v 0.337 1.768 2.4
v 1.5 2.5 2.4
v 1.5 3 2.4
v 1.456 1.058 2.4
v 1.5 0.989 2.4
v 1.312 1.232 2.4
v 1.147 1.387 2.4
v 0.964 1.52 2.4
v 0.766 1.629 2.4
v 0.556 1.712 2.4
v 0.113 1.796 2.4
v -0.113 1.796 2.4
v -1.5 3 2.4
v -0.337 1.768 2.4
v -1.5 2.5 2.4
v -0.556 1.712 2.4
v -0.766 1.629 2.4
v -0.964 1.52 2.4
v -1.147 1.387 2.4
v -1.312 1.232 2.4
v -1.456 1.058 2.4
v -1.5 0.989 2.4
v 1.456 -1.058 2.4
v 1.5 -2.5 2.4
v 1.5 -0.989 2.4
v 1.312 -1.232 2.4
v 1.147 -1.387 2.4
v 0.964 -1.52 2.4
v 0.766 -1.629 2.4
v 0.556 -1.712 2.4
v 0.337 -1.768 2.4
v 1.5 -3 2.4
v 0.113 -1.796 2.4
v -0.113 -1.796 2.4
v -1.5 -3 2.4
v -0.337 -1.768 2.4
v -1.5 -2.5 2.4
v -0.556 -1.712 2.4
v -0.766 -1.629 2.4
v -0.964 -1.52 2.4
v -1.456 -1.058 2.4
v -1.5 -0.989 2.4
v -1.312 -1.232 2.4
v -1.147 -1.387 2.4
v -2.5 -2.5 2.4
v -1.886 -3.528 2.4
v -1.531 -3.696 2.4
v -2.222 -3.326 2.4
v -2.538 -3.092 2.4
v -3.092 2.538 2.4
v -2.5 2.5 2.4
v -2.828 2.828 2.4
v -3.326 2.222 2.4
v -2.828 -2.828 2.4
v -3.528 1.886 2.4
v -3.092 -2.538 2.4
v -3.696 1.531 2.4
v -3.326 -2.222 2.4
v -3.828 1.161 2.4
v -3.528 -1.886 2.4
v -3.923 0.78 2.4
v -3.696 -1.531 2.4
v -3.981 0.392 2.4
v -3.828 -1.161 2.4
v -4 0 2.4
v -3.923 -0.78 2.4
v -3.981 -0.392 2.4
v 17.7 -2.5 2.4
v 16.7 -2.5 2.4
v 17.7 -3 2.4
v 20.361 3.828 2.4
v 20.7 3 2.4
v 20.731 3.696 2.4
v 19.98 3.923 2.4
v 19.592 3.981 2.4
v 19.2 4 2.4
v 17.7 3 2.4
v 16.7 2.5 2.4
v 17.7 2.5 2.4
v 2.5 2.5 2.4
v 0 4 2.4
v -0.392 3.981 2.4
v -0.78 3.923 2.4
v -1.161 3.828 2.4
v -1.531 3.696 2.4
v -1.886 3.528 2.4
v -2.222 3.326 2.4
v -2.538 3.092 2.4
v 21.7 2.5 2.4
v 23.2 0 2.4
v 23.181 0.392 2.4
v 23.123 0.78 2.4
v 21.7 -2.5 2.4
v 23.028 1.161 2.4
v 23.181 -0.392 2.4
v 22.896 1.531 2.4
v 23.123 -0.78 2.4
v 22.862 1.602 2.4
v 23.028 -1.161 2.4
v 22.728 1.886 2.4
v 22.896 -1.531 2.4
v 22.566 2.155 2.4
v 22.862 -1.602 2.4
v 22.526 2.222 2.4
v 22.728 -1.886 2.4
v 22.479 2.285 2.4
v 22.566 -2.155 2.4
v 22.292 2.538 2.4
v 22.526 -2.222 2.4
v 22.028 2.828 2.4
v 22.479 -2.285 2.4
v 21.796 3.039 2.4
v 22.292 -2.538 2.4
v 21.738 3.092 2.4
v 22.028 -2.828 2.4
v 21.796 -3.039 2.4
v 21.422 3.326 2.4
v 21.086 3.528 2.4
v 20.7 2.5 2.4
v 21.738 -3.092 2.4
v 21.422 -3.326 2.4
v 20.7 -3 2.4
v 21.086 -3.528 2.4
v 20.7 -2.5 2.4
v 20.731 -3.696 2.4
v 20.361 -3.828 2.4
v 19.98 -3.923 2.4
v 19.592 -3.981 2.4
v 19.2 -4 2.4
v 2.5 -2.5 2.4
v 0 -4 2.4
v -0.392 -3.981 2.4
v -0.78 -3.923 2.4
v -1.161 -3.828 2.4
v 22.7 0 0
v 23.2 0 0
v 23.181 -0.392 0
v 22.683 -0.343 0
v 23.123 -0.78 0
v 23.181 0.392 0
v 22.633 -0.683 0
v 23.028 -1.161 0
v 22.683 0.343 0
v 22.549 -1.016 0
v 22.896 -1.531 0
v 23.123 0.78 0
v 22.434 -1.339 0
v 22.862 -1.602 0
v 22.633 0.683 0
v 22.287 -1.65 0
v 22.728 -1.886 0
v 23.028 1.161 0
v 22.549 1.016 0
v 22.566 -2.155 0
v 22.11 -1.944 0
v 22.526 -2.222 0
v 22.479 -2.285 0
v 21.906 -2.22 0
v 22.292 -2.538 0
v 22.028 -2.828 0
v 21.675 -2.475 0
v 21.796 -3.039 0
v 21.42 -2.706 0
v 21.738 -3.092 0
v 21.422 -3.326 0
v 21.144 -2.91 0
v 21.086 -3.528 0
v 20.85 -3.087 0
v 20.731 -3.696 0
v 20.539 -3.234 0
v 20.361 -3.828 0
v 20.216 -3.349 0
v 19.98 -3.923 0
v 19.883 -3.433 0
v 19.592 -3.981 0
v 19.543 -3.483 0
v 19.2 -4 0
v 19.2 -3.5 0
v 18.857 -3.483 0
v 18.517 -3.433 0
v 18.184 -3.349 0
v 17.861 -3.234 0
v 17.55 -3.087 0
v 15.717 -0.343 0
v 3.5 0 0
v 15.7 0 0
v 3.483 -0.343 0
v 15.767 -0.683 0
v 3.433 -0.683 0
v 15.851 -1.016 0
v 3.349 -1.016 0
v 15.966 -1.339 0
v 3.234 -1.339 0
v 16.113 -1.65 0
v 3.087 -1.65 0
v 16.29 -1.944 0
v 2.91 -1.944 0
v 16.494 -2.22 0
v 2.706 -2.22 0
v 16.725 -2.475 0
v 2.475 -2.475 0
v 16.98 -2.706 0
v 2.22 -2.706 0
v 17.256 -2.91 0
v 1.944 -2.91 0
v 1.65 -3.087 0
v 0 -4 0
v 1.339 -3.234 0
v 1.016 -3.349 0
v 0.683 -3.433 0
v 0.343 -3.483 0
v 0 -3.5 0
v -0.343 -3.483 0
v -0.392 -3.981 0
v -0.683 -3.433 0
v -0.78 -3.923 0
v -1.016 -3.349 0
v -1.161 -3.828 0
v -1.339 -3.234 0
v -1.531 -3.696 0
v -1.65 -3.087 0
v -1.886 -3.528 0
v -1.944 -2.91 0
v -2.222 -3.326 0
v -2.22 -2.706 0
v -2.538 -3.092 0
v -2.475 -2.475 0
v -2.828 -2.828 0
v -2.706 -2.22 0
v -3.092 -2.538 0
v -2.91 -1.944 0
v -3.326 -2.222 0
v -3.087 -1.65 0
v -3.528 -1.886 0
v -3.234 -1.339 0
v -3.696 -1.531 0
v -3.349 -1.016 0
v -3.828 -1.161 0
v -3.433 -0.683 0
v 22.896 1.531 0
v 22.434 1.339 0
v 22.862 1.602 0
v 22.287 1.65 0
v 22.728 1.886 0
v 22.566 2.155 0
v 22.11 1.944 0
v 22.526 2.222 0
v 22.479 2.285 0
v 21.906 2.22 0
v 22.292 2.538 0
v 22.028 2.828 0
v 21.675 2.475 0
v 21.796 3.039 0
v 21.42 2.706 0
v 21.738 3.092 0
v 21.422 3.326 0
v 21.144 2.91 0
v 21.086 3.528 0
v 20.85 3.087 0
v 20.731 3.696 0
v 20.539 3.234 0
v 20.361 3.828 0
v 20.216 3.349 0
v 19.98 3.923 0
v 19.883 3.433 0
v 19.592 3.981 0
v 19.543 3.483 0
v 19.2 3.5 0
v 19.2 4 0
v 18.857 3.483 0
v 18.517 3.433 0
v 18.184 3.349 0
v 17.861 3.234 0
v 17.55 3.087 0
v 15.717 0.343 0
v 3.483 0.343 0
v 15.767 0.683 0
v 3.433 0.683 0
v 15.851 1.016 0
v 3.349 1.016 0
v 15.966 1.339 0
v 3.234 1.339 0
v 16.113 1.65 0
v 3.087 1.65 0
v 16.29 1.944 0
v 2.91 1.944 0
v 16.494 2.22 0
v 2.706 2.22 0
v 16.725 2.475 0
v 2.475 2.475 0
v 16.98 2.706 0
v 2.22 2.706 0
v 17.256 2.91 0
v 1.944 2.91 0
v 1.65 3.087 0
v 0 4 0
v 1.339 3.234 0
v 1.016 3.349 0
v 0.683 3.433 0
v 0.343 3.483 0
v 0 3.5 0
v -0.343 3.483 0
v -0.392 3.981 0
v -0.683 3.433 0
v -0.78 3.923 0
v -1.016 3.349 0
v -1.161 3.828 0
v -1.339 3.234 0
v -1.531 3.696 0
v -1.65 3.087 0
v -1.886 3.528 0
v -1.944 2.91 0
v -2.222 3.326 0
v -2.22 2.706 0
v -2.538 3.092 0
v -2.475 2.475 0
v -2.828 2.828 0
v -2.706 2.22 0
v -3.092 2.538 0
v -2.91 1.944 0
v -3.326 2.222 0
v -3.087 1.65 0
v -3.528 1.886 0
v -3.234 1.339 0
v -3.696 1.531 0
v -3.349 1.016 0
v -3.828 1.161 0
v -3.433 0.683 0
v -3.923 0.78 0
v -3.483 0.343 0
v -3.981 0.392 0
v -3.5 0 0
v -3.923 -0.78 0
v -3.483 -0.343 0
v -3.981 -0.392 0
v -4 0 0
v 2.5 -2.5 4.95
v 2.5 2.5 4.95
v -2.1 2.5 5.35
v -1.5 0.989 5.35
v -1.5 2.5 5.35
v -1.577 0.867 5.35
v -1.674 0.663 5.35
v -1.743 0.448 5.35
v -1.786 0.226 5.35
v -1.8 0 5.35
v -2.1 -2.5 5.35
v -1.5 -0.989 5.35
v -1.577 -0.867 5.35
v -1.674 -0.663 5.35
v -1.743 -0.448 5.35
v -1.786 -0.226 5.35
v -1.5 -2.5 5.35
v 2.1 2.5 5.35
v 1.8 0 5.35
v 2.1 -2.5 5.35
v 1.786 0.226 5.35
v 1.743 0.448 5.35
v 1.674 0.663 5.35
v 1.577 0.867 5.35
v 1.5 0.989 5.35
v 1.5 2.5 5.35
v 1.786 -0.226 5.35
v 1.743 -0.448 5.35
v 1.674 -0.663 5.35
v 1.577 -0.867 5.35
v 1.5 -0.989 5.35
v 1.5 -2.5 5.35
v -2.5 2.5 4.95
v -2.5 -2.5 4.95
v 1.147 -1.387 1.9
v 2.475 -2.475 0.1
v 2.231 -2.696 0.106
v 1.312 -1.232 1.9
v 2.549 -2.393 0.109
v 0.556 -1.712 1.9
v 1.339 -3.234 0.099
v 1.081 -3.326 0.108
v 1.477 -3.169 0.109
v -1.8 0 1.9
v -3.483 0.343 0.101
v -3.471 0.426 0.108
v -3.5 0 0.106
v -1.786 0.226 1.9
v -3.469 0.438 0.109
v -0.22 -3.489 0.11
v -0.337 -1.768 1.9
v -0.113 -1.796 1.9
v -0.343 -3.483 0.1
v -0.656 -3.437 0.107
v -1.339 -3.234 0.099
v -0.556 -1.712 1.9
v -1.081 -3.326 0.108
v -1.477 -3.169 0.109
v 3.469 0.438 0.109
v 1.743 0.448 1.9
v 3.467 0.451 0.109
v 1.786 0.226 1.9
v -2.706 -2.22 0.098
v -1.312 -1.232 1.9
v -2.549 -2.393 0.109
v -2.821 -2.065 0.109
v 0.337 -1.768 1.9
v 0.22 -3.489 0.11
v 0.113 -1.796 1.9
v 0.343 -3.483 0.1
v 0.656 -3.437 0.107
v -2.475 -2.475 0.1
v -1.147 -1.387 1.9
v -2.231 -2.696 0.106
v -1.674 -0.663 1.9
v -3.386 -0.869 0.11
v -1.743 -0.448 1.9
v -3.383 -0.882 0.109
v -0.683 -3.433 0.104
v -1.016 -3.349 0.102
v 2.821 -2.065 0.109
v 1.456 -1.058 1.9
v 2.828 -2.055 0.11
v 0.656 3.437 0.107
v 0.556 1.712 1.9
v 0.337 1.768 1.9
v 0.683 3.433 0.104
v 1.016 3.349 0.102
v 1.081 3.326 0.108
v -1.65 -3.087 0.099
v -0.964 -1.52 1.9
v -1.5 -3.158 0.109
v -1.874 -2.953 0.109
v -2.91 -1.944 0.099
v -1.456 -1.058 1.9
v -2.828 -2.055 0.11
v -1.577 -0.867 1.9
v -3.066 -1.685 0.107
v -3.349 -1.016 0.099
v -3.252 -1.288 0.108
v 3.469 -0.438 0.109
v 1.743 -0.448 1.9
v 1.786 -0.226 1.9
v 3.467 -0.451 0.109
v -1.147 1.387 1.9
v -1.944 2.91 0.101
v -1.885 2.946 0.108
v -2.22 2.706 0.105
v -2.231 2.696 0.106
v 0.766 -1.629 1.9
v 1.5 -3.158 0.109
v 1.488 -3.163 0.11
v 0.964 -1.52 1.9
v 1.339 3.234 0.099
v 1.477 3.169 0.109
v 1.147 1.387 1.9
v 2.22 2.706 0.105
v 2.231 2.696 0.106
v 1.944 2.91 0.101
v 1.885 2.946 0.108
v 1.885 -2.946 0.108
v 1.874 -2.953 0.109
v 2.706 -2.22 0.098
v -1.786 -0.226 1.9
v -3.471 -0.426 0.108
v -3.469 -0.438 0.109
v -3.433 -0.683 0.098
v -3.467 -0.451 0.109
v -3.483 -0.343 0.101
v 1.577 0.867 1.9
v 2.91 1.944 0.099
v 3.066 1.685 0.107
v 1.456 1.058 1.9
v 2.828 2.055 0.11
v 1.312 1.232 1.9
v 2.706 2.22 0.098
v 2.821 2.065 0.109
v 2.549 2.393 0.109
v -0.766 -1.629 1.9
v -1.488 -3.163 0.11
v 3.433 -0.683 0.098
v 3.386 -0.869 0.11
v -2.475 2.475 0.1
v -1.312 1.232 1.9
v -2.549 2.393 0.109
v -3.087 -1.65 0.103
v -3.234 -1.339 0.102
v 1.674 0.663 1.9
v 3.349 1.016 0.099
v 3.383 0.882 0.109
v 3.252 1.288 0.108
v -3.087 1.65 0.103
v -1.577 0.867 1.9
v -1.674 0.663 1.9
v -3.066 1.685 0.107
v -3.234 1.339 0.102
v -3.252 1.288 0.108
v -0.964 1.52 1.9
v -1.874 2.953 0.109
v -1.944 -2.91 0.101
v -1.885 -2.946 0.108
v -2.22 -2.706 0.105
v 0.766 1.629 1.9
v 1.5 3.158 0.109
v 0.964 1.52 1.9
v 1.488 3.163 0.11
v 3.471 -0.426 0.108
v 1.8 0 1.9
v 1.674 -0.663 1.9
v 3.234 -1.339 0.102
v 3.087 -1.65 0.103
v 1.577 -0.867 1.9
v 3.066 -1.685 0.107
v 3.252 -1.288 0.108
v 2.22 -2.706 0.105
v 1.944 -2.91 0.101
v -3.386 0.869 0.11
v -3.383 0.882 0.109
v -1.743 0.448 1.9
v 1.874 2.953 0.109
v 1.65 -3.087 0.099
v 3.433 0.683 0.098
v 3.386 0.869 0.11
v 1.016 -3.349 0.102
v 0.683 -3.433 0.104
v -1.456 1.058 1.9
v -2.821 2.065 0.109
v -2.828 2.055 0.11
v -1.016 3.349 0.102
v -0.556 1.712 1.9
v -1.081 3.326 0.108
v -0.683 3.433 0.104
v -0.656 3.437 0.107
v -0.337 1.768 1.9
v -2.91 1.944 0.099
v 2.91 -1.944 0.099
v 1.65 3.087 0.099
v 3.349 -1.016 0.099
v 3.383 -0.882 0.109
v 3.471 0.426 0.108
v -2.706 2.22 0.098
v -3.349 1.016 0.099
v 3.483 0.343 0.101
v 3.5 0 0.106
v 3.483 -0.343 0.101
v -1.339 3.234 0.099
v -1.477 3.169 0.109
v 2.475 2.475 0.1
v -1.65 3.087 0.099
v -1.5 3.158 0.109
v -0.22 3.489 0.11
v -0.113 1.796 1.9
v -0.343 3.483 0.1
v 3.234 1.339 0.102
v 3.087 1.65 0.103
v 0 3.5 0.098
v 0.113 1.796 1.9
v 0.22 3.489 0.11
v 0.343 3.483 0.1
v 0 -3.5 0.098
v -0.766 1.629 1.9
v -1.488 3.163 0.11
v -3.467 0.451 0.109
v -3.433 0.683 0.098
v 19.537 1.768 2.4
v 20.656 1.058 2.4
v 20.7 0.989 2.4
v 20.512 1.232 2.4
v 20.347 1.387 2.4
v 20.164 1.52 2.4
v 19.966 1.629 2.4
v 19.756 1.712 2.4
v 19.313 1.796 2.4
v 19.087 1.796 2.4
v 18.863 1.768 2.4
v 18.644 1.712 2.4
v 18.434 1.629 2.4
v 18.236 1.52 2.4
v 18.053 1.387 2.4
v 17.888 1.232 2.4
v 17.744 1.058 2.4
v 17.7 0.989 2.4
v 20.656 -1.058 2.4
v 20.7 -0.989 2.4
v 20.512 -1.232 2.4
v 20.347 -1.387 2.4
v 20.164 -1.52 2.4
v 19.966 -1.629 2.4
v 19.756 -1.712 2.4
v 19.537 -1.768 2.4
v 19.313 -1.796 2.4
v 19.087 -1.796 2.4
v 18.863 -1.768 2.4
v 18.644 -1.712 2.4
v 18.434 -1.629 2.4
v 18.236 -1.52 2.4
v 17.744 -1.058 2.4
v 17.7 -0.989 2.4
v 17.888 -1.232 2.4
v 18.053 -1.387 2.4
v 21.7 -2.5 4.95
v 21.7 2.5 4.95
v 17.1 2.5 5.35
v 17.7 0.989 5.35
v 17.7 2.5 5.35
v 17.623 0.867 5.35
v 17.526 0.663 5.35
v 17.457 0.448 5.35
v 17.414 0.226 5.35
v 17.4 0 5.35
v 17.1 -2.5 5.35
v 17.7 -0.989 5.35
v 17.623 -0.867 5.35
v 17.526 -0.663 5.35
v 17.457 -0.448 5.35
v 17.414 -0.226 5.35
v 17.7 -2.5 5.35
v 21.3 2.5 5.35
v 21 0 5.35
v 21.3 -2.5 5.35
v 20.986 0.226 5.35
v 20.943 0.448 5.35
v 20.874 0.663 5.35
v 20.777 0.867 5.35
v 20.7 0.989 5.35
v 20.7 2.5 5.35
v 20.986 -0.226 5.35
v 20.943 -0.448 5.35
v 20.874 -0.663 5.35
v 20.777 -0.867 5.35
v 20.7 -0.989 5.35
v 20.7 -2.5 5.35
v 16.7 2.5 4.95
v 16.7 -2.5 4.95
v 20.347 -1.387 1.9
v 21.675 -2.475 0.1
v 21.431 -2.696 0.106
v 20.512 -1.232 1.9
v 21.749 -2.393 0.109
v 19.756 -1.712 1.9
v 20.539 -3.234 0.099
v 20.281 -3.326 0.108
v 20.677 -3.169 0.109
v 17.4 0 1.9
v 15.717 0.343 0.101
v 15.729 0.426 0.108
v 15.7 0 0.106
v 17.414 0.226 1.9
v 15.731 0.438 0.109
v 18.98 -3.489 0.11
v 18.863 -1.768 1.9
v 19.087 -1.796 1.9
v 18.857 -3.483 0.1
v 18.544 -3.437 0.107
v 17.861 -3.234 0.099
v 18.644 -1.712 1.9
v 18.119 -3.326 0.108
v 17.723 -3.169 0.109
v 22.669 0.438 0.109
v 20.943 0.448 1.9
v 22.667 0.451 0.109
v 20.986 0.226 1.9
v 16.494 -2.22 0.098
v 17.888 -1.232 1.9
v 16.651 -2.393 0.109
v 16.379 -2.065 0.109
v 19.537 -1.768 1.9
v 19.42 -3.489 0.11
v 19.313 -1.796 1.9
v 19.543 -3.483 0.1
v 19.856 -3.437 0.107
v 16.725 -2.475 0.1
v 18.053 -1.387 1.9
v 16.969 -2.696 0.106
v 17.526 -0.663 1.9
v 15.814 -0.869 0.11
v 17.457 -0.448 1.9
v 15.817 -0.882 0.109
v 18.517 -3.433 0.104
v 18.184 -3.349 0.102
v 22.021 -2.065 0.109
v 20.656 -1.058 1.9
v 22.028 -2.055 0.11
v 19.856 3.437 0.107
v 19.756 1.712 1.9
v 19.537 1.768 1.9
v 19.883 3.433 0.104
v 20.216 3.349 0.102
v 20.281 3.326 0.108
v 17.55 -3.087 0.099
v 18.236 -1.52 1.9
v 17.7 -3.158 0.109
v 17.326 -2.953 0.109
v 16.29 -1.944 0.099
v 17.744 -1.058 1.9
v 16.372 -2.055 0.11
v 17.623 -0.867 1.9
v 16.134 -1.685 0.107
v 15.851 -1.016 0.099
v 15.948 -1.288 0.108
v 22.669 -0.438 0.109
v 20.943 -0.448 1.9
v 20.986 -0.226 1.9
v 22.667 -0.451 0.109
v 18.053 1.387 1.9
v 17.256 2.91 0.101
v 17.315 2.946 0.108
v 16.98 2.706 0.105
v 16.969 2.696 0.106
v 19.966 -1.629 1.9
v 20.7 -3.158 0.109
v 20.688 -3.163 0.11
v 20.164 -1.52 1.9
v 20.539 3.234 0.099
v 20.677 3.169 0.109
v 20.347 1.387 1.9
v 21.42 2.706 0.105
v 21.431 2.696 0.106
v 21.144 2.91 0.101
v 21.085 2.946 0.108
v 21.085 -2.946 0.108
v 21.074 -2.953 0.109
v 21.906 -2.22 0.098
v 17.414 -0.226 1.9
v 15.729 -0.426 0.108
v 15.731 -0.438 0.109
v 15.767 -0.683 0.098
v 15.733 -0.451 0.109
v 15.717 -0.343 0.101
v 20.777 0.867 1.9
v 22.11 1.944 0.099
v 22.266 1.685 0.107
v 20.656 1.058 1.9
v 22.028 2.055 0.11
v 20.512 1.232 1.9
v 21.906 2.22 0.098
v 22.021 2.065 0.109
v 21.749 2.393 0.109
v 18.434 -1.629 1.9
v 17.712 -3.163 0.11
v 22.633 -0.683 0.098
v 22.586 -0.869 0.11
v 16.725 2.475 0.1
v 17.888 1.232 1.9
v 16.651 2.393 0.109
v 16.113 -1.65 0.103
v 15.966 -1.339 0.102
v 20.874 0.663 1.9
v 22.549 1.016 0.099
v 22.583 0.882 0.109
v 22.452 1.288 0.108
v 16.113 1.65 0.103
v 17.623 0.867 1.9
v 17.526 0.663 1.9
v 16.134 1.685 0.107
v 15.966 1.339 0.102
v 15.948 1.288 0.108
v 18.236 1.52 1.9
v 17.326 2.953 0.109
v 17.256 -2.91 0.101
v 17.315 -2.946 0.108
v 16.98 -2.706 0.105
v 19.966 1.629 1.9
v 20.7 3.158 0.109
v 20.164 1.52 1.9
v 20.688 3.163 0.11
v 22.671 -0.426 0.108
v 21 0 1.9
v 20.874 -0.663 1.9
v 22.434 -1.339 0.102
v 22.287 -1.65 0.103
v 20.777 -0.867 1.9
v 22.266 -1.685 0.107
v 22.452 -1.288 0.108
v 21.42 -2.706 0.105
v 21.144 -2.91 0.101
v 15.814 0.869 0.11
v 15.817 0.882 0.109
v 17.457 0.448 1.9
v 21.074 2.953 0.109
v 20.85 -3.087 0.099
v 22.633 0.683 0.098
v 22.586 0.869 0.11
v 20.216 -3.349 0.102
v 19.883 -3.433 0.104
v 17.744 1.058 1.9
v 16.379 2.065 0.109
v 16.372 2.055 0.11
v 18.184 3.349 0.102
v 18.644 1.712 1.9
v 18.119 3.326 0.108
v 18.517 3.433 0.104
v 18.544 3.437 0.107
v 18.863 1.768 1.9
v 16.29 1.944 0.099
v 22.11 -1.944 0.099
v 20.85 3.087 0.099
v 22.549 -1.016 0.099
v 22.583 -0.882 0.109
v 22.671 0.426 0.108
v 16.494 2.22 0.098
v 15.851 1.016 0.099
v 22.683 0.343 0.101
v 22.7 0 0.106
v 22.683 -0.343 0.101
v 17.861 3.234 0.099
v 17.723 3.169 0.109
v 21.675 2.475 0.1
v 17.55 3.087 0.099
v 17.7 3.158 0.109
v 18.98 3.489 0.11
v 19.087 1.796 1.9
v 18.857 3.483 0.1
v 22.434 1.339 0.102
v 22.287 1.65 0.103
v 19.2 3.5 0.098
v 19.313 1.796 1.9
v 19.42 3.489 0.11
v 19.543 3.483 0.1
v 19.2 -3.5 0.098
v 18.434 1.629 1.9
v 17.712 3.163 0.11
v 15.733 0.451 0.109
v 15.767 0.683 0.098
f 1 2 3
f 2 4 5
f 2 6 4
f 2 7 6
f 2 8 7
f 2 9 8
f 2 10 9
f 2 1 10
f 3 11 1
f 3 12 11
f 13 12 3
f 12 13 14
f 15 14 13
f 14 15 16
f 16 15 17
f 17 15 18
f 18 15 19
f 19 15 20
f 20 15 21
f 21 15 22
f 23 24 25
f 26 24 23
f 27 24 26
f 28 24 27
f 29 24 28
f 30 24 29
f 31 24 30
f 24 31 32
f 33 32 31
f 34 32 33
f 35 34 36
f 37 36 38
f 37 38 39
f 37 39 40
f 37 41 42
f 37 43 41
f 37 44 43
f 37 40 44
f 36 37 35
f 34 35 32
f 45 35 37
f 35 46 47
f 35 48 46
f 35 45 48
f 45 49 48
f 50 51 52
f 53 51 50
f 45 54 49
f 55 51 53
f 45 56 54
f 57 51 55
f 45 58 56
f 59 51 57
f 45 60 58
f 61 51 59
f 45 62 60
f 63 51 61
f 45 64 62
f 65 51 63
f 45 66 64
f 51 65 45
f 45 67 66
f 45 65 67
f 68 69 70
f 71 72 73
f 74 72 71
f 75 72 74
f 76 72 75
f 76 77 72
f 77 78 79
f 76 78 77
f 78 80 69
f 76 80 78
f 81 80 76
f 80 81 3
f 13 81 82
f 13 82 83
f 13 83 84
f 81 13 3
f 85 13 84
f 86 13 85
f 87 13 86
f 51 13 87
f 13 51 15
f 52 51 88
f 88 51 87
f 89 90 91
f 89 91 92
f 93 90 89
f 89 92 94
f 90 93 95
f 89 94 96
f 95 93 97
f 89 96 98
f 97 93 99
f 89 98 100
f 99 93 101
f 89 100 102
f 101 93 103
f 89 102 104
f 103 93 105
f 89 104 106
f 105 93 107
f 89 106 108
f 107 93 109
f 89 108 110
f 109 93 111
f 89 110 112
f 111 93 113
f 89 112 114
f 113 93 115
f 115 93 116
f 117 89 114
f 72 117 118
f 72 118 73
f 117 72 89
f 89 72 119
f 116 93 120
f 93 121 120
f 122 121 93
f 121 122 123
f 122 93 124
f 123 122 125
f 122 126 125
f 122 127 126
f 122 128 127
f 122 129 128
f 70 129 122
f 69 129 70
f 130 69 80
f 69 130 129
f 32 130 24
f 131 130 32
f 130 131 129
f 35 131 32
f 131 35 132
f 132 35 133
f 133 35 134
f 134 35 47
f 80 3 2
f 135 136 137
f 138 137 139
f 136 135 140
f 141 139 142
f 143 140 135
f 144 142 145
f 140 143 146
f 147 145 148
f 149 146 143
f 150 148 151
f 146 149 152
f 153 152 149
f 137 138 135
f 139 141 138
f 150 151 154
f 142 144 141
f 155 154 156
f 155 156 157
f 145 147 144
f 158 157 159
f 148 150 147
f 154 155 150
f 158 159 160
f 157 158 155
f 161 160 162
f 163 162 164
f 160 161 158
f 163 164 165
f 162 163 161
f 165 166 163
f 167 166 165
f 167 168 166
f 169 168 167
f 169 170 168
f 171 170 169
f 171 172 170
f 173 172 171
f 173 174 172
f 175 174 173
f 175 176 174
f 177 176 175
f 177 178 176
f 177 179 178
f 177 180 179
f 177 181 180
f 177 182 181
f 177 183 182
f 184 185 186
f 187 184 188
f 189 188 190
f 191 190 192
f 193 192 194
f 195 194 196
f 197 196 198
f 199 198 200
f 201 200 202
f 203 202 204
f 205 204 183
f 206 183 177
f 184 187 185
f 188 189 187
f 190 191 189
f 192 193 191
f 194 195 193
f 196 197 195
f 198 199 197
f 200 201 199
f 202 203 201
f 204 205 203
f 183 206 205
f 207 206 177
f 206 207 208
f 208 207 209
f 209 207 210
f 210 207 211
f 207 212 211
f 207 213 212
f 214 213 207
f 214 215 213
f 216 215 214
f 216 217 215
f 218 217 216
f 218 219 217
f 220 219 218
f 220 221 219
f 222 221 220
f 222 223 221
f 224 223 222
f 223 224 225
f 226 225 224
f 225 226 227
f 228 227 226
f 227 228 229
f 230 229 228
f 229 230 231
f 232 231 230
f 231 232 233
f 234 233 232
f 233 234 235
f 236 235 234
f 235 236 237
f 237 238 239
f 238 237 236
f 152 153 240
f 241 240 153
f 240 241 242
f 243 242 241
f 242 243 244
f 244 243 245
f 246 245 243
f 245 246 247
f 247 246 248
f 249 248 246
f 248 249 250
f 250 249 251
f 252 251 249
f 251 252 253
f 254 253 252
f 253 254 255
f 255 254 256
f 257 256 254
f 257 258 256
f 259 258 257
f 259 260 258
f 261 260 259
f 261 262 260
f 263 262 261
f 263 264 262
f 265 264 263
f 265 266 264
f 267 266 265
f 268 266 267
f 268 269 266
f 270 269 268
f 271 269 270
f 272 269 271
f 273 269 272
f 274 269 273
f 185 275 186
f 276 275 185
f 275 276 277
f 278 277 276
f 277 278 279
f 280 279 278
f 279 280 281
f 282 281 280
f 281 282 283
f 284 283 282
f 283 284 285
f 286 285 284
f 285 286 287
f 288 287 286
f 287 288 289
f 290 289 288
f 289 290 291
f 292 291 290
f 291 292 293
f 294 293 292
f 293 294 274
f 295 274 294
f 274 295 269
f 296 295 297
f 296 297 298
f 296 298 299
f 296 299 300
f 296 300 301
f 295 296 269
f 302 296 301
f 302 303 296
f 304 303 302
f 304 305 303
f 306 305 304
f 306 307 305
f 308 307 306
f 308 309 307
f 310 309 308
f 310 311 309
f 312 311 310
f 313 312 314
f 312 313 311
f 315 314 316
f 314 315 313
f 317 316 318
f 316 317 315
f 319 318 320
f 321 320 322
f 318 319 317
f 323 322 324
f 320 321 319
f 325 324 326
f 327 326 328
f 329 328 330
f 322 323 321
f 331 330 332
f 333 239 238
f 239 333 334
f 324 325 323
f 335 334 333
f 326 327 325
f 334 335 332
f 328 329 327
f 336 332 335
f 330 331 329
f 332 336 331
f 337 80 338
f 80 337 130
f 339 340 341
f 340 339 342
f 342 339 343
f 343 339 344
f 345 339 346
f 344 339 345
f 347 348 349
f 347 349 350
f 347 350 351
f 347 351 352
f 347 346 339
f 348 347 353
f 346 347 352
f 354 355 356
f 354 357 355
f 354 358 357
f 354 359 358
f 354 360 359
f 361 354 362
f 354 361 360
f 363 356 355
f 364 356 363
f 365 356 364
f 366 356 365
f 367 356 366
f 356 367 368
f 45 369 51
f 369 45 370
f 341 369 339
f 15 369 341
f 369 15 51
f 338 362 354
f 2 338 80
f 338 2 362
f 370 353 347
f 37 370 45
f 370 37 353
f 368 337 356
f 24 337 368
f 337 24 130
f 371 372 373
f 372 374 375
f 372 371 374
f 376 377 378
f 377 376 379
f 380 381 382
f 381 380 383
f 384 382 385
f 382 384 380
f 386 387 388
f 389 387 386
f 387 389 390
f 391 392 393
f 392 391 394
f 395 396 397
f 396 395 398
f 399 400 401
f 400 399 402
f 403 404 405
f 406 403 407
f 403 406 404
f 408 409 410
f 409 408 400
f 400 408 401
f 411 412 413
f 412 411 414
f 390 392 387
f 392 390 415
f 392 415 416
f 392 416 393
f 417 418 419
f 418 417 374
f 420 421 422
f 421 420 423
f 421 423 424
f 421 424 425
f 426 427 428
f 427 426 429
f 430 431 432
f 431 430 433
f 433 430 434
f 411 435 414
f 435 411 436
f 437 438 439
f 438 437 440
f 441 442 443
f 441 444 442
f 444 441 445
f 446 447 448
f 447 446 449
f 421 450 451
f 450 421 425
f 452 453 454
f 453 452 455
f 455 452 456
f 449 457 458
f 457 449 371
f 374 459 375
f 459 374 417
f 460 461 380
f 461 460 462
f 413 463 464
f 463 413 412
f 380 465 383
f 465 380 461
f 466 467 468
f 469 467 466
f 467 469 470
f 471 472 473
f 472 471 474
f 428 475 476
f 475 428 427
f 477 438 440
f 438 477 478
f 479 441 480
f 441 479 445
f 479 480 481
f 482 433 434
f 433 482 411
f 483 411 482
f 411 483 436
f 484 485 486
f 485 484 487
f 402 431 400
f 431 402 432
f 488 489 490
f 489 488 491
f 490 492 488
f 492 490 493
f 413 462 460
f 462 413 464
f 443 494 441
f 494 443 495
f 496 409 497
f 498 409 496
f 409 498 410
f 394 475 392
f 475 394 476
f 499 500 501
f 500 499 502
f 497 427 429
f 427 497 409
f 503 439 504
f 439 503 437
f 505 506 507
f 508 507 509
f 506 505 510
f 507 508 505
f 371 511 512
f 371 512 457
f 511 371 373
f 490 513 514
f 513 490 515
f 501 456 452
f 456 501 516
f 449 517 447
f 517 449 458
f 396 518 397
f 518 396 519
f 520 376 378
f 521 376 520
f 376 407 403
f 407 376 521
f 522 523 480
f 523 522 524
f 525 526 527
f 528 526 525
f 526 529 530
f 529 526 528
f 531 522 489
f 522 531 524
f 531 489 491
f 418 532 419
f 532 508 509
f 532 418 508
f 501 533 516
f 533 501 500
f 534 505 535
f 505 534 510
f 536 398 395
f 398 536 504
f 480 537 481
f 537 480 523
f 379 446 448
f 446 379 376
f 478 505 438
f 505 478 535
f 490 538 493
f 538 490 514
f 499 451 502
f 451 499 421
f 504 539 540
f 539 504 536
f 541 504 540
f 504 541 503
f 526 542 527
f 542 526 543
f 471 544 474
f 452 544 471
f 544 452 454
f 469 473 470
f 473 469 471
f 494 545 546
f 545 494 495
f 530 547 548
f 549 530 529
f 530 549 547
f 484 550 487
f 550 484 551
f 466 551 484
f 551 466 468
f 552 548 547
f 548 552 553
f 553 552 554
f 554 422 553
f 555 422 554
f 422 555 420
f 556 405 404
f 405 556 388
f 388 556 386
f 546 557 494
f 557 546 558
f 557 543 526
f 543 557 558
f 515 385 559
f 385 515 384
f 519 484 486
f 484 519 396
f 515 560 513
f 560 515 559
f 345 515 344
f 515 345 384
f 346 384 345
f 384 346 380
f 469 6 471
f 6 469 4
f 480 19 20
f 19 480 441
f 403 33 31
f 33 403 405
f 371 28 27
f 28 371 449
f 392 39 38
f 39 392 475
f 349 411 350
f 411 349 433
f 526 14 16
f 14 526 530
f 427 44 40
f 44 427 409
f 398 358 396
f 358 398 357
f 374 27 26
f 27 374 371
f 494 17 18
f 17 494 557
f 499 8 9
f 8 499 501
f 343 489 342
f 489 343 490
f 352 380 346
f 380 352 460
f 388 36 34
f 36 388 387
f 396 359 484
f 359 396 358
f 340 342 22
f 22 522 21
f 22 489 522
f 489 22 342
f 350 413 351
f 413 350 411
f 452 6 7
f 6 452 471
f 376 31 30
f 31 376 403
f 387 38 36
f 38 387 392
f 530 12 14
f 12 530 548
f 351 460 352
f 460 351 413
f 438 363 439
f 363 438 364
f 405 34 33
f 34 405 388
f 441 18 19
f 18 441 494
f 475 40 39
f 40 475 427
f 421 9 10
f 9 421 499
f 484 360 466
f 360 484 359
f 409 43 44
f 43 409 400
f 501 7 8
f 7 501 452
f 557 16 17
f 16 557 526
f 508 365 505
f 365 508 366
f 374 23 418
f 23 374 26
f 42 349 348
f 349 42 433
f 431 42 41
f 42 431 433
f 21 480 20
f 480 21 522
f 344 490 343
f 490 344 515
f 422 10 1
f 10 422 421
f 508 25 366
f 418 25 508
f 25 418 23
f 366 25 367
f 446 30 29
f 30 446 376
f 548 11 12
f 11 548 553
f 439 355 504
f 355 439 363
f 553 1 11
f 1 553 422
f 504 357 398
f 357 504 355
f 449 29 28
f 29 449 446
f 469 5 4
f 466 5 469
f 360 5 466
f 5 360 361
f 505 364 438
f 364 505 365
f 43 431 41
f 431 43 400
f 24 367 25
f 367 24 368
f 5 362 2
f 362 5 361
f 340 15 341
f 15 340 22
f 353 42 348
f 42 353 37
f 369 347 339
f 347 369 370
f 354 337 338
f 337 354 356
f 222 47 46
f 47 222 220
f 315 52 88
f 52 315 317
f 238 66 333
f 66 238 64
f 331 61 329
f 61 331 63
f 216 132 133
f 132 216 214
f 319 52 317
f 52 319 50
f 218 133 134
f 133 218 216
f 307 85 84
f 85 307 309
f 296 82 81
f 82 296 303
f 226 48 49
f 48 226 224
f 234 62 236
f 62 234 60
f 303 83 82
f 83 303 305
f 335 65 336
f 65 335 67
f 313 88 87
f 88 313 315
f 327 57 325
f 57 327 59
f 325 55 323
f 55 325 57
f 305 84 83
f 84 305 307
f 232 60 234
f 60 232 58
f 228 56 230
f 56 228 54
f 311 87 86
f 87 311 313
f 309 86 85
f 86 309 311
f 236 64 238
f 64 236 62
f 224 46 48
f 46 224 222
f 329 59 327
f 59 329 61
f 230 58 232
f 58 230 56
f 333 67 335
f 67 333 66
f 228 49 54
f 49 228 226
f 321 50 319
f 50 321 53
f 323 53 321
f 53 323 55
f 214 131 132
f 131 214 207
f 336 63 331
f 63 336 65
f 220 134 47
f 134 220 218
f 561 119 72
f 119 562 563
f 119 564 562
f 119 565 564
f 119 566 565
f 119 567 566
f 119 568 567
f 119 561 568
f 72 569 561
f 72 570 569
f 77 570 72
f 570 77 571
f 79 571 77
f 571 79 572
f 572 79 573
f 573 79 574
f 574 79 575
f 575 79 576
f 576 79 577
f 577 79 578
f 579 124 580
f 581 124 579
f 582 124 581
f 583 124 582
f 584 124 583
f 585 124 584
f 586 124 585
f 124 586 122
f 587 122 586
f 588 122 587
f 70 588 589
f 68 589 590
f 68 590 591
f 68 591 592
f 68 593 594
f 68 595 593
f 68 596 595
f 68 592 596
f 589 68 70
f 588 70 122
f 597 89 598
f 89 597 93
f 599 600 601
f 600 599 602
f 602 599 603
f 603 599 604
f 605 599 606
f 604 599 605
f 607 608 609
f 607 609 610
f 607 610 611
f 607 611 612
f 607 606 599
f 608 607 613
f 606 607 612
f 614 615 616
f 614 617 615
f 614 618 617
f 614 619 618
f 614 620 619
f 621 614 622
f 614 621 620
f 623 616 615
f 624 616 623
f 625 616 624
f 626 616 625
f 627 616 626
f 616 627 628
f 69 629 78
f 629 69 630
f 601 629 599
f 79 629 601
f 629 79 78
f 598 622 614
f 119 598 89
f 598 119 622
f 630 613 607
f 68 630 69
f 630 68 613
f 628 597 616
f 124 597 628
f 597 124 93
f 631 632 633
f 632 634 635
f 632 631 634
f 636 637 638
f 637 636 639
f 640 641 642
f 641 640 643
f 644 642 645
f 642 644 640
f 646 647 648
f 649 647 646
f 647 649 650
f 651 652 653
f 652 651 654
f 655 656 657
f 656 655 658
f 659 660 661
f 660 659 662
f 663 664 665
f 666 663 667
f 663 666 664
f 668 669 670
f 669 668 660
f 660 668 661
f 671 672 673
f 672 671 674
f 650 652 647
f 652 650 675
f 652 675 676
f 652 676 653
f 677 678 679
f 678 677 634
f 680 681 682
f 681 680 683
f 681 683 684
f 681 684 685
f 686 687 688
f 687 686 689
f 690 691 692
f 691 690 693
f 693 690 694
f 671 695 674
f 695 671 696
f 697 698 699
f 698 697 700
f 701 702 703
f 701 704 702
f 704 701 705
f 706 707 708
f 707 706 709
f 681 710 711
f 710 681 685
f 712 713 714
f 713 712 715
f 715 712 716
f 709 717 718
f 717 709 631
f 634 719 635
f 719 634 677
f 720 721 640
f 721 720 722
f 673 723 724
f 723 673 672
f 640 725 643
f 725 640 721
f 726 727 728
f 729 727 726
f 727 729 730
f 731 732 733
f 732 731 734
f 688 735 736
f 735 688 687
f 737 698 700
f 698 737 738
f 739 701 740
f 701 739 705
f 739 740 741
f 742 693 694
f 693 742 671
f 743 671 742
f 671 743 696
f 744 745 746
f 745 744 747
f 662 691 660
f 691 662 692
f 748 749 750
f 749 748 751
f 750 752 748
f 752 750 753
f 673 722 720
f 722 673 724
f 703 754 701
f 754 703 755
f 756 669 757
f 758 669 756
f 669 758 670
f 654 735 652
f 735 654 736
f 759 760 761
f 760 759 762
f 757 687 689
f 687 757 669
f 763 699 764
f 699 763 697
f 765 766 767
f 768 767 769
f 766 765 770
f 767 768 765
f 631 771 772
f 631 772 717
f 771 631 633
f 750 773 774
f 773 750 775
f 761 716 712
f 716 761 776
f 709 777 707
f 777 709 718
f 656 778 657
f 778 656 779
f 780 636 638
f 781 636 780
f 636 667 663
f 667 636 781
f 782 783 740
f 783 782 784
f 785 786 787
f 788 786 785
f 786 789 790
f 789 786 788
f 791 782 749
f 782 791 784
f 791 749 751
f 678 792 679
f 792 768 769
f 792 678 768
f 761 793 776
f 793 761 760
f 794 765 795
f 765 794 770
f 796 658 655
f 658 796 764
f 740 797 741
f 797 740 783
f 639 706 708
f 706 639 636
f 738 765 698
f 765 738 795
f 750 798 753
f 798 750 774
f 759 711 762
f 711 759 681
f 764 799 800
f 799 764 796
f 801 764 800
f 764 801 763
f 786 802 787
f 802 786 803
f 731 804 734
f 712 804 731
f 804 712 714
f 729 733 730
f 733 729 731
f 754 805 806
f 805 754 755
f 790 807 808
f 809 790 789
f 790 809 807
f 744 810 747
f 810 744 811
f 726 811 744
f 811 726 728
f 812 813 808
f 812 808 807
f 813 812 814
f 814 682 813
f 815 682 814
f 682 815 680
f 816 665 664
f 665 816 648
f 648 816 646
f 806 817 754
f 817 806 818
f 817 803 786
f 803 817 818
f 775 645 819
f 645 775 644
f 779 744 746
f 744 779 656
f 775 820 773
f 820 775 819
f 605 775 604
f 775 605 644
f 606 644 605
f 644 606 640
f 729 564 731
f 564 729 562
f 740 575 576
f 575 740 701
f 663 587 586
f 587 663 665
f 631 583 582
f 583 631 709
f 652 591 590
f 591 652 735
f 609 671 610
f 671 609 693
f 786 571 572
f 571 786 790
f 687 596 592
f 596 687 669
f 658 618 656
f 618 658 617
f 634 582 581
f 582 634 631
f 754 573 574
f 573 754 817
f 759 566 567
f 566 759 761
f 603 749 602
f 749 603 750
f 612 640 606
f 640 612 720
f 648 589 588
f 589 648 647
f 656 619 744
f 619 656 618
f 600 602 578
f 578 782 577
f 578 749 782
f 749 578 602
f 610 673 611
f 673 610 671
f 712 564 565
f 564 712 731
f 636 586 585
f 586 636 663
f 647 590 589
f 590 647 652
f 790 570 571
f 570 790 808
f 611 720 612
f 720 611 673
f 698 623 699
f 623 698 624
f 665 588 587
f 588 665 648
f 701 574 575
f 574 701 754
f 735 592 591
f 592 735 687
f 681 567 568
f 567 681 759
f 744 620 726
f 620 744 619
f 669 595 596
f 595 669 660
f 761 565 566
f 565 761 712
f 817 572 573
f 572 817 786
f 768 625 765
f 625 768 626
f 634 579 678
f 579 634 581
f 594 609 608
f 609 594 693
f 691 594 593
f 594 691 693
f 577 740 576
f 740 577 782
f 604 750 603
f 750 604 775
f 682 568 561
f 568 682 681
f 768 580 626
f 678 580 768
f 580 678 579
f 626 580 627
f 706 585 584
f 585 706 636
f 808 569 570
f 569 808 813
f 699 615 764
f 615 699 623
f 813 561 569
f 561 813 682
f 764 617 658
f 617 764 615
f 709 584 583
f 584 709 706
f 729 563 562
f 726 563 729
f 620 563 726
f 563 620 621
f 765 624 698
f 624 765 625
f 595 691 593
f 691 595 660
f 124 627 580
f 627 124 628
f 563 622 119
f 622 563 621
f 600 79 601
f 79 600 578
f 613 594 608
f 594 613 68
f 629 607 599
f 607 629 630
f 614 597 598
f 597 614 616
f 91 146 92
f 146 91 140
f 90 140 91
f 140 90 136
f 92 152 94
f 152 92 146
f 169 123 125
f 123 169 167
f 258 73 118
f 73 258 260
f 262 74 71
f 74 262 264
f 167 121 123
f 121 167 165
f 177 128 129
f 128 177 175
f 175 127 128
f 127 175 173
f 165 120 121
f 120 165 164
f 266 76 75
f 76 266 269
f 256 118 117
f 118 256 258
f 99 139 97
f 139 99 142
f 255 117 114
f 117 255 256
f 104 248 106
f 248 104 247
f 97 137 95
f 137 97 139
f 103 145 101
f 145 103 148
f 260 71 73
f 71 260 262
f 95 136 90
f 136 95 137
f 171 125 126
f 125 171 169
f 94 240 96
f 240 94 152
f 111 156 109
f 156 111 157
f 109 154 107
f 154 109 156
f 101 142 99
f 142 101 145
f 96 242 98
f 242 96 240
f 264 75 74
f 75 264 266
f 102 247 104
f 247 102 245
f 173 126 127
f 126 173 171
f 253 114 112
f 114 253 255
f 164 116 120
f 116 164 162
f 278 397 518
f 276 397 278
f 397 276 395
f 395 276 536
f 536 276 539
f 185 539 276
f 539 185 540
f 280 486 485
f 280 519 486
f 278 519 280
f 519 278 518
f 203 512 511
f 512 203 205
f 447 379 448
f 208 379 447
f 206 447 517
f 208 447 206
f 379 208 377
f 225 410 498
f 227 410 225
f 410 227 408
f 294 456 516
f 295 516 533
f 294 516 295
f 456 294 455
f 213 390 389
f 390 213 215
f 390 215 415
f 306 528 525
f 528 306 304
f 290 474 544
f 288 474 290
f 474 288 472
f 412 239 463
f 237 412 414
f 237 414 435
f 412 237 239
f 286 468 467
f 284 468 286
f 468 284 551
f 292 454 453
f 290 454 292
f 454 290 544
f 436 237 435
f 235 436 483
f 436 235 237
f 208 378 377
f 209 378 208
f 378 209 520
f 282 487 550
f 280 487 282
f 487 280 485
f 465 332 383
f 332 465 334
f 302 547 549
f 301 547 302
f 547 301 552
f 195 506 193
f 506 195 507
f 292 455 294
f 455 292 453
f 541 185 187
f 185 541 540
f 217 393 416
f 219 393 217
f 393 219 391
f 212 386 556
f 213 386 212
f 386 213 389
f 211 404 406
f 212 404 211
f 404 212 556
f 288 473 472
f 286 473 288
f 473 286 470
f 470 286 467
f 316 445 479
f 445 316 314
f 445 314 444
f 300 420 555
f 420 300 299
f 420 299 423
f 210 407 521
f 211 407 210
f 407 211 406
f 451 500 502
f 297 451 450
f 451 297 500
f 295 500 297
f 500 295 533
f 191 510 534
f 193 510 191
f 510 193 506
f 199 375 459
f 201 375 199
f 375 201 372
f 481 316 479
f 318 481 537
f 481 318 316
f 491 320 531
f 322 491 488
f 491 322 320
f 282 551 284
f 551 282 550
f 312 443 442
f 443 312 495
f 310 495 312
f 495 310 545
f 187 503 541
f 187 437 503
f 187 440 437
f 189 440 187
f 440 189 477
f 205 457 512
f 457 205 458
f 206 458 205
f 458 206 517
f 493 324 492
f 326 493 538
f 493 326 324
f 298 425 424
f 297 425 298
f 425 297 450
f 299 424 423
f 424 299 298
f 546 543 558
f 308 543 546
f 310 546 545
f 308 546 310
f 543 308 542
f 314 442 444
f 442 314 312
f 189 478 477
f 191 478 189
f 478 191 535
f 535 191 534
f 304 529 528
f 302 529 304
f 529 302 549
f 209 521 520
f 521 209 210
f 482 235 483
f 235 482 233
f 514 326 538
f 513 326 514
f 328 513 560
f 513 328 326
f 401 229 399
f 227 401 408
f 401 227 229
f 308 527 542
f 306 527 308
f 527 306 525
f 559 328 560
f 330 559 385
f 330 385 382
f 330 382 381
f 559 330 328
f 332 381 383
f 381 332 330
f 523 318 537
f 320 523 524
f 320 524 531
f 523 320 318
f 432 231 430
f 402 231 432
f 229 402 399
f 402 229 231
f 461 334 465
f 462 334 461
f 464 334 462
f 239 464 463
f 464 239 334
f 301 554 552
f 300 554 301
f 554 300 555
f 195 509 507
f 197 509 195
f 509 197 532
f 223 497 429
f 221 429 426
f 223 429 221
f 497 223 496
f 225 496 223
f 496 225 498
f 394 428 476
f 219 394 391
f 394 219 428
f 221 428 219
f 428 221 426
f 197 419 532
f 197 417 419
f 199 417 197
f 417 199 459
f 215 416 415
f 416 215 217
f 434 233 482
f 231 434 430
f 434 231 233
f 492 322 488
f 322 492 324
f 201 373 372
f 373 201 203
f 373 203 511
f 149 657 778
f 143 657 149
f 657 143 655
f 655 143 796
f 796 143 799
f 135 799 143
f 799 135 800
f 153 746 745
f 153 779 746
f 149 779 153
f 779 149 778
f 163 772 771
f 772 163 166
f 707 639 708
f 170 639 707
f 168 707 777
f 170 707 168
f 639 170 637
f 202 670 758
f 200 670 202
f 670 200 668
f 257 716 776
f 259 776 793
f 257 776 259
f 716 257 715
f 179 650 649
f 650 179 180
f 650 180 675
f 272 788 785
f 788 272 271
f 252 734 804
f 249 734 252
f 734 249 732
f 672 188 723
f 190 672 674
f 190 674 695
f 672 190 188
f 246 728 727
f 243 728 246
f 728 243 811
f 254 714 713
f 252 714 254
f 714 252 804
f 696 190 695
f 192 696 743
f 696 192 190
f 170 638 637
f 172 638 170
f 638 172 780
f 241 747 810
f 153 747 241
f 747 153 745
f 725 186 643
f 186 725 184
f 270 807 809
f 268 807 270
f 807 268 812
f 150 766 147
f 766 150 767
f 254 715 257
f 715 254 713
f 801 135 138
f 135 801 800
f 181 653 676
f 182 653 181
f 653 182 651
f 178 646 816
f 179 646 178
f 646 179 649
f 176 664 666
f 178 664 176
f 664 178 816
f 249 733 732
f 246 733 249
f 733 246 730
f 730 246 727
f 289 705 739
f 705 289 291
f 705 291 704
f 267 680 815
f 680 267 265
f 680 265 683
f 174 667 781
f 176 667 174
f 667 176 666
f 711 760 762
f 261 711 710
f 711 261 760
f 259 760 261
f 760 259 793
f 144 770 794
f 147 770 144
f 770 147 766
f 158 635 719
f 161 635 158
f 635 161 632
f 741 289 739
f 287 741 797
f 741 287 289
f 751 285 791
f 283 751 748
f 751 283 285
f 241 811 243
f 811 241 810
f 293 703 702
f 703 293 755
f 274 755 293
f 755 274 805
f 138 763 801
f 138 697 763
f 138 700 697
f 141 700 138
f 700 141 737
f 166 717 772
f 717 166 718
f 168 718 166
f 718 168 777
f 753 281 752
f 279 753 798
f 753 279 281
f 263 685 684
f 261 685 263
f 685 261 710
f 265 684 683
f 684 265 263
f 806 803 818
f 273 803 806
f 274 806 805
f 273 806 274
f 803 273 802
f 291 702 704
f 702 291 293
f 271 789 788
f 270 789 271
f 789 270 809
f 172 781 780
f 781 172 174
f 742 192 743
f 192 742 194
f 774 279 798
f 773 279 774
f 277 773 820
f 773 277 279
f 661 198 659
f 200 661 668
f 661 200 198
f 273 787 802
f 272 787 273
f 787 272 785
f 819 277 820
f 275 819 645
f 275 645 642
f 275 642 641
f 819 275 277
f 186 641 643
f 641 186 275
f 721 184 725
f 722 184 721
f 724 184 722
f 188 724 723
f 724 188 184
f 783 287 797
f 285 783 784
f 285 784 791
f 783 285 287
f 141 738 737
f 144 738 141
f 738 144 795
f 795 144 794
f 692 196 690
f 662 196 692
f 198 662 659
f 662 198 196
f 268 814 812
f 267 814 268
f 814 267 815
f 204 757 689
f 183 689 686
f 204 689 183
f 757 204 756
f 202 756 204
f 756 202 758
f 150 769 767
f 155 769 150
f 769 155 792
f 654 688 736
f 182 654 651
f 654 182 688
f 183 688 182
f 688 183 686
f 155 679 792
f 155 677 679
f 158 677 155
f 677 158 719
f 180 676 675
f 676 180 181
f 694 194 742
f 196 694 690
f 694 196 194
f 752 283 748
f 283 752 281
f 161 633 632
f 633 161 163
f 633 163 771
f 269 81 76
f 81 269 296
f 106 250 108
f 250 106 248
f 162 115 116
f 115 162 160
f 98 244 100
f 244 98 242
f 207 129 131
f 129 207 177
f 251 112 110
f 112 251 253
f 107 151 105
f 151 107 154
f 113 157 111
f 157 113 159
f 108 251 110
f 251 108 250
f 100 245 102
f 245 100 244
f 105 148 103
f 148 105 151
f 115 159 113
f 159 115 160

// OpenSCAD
// file: native_adapter.scad
$fn = 50;

difference() {
	union() {
		translate(v = [0, 0, 0]) {
			rotate(a = [0, 0, 0]) {
				difference() {
					union() {
						translate(v = [0, 0, 0]) {
							rotate(a = [0, 0, 0]) {
								difference() {
									union() {
										translate(v = [-0.35, 0, 0]) {
											hull() {
												translate(v = [-4.4, 4.25, 0]) {
													cylinder(h = 2.4, r = 0.75);
												}
												translate(v = [4.4, 4.25, 0]) {
													cylinder(h = 2.4, r = 0.75);
												}
												translate(v = [-4.4, -4.25, 0]) {
													cylinder(h = 2.4, r = 0.75);
												}
												translate(v = [4.4, -4.25, 0]) {
													cylinder(h = 2.4, r = 0.75);
												}
											}
										}
										translate(v = [-2.5, -2.5, 2.35]) {
											cube(size = [5.0, 5.0, 3.0]);
										}
									}
									union() {
										translate(v = [0, 0, 0]) {
											rotate(a = [0, 180, 0]) {
												difference() {
													union() {
														translate(v = [0, 0, -20.0]) {
															cylinder(h = 20.0, r = 1.5);
														}
														translate(v = [0, 0, -1.9]) {
															cylinder(h = 1.9, r1 = 1.8, r2 = 3.6);
														}
														cylinder(h = 250, r = 3.6);
														translate(v = [0, 0, -20.0]) {
															cylinder(h = 20.0, r = 1.8);
														}
														translate(v = [0, 0, -20.0]) {
															cylinder(h = 20.0, r = 1.5);
														}
													}
													union();
												}
											}
										}
										translate(v = [-1.5, -3.0, 2.4]) {
											cube(size = [3.0, 6.0, 3.0500000000000003]);
										}
										translate(v = [0, 2.6, 0]) {
											rotate(a = [90, 0, 0]) {
												linear_extrude(height = 5.2) {
													polygon(points = [[-2.7, 4.75], [-1.9, 5.55], [-2.7, 5.55]]);
												}
											}
										}
										translate(v = [0, 2.6, 0]) {
											rotate(a = [90, 0, 0]) {
												linear_extrude(height = 5.2) {
													polygon(points = [[2.7, 4.75], [1.9, 5.55], [2.7, 5.55]]);
												}
											}
										}
										translate(v = [-4.6, -5.5, -0.1]) {
											cylinder(h = 2.6, r = 3.15);
										}
										translate(v = [-4.6, 5.5, -0.1]) {
											cylinder(h = 2.6, r = 3.15);
										}
										translate(v = [4.6, -5.5, -0.1]) {
											cylinder(h = 2.6, r = 3.15);
										}
										translate(v = [4.6, 5.5, -0.1]) {
											cylinder(h = 2.6, r = 3.15);
										}
									}
								}
							}
						}
					}
					union();
				}
			}
		}
	}
	union();
}
// file: beam_joint_geometry.scad
$fn=64;
tie_t=2.4;
module native_adapter(){
include <native_adapter.scad>
}

module joint_bores(holes,wood) {
  // Leave the OOBB countersink and pilot cheeks of each native adapter intact.
  for(p=holes) translate([p[0],p[1],-.05]) cylinder(d=7,h=tie_t+.1);
  if(len(wood)) translate(wood) {
    translate([0,0,-.05]) cylinder(d=4,h=tie_t+.1);
    translate([0,0,-.01]) cylinder(d1=7.02,d2=4,h=1.51);
  }
}

module foot(p,r) { translate(p) circle(r=r); }
module strap(a,b,ra,rb) { hull(){ foot(a,ra); foot(b,rb); } }
module beam_joint(holes,spine=[],wood=[]) {
  union(){
    for(p=holes) translate(p) intersection(){
      native_adapter();
      cylinder(r=4,h=12);
    }
    difference(){
      linear_extrude(tie_t) union(){
        if(len(wood)) strap(holes[0],wood,4,4.6);
        else if(len(spine)==0) strap(holes[0],holes[1],4,4);
        else {
          strap(spine[0],spine[1],2.65,2.65);
          for(p=holes) strap(p,[spine[0][0],p[1]],4,2.65);
        }
      }
      joint_bores(holes,wood);
    }
  }
}
// file: cabinet_geometry.scad
t=12;
inside_w=593.4000000000001;
inside_h=665.5000000000001;
cap_w=617.4000000000001;
depth=209.0;
face_t=6.0;
tie_t=2.4;
hole_x=89.3;
low_y=99.65;
stations=[22, 58.5, 104.5, 150.5, 187.0];
retainer_y=[22.599999999999994, 655.0000000000001];
$fn=64;

module cap_bores() {
  for (side=[-1,1], i=[0:4])
    translate([side*(inside_w/2+t/2),0,stations[i]]) rotate([-90,0,0])
      if (i%2==0) translate([0,0,-.01]) cylinder(d=6.1,h=8.01);
      else {
        translate([0,0,-.01]) cylinder(d=4,h=t+.02);
        translate([0,0,t-1.5]) cylinder(d1=4,d2=7.02,h=1.51);
      }
}
module side_bores() {
  for (bottom=[0,1], i=[0:4])
    translate([t/2,bottom*inside_h,stations[i]]) rotate([bottom?90:-90,0,0])
      translate([0,0,-.01]) cylinder(d=i%2?2.5:6.1,h=i%2?21.01:17.01);
  for (back=[0,1], y=retainer_y)
    translate([t/2,y,back*depth]) rotate([0,back?180:0,0])
      translate([0,0,-.01]) cylinder(d=2.5,h=16.01);
}

module cap_panel() {
  difference() {
    translate([-cap_w/2,0,0]) cube([cap_w,t,depth]);
    cap_bores();
  }
}
module side_panel() {
  difference() {
    cube([t,inside_h,depth]);
    side_bores();
  }
}
module wood_screw(length) {
  // Flush 90-degree head, nominal shank and tapered point. Thread envelope.
  difference(){
    union(){
      cylinder(h=1.75,d1=7,d2=3.5);
      translate([0,0,1.74]) cylinder(h=length-4.74,d=3.5);
      translate([0,0,length-3.01]) cylinder(h=3.01,d1=3.5,d2=0);
    }
    for(a=[0,90]) rotate([0,0,a]) translate([-2,-.4,-.01]) cube([4,.8,.81]);
  }
}
module dowel() {
  cylinder(h=.5,d1=5,d2=6);
  translate([0,0,.5]) cylinder(d=6,h=23);
  translate([0,0,23.5]) cylinder(h=.5,d1=6,d2=5);
}
// main file
include <cabinet_geometry.scad>
include <beam_joint_geometry.scad>
beam_joint([[0, 0], [19.2, 0]],[],[]);
